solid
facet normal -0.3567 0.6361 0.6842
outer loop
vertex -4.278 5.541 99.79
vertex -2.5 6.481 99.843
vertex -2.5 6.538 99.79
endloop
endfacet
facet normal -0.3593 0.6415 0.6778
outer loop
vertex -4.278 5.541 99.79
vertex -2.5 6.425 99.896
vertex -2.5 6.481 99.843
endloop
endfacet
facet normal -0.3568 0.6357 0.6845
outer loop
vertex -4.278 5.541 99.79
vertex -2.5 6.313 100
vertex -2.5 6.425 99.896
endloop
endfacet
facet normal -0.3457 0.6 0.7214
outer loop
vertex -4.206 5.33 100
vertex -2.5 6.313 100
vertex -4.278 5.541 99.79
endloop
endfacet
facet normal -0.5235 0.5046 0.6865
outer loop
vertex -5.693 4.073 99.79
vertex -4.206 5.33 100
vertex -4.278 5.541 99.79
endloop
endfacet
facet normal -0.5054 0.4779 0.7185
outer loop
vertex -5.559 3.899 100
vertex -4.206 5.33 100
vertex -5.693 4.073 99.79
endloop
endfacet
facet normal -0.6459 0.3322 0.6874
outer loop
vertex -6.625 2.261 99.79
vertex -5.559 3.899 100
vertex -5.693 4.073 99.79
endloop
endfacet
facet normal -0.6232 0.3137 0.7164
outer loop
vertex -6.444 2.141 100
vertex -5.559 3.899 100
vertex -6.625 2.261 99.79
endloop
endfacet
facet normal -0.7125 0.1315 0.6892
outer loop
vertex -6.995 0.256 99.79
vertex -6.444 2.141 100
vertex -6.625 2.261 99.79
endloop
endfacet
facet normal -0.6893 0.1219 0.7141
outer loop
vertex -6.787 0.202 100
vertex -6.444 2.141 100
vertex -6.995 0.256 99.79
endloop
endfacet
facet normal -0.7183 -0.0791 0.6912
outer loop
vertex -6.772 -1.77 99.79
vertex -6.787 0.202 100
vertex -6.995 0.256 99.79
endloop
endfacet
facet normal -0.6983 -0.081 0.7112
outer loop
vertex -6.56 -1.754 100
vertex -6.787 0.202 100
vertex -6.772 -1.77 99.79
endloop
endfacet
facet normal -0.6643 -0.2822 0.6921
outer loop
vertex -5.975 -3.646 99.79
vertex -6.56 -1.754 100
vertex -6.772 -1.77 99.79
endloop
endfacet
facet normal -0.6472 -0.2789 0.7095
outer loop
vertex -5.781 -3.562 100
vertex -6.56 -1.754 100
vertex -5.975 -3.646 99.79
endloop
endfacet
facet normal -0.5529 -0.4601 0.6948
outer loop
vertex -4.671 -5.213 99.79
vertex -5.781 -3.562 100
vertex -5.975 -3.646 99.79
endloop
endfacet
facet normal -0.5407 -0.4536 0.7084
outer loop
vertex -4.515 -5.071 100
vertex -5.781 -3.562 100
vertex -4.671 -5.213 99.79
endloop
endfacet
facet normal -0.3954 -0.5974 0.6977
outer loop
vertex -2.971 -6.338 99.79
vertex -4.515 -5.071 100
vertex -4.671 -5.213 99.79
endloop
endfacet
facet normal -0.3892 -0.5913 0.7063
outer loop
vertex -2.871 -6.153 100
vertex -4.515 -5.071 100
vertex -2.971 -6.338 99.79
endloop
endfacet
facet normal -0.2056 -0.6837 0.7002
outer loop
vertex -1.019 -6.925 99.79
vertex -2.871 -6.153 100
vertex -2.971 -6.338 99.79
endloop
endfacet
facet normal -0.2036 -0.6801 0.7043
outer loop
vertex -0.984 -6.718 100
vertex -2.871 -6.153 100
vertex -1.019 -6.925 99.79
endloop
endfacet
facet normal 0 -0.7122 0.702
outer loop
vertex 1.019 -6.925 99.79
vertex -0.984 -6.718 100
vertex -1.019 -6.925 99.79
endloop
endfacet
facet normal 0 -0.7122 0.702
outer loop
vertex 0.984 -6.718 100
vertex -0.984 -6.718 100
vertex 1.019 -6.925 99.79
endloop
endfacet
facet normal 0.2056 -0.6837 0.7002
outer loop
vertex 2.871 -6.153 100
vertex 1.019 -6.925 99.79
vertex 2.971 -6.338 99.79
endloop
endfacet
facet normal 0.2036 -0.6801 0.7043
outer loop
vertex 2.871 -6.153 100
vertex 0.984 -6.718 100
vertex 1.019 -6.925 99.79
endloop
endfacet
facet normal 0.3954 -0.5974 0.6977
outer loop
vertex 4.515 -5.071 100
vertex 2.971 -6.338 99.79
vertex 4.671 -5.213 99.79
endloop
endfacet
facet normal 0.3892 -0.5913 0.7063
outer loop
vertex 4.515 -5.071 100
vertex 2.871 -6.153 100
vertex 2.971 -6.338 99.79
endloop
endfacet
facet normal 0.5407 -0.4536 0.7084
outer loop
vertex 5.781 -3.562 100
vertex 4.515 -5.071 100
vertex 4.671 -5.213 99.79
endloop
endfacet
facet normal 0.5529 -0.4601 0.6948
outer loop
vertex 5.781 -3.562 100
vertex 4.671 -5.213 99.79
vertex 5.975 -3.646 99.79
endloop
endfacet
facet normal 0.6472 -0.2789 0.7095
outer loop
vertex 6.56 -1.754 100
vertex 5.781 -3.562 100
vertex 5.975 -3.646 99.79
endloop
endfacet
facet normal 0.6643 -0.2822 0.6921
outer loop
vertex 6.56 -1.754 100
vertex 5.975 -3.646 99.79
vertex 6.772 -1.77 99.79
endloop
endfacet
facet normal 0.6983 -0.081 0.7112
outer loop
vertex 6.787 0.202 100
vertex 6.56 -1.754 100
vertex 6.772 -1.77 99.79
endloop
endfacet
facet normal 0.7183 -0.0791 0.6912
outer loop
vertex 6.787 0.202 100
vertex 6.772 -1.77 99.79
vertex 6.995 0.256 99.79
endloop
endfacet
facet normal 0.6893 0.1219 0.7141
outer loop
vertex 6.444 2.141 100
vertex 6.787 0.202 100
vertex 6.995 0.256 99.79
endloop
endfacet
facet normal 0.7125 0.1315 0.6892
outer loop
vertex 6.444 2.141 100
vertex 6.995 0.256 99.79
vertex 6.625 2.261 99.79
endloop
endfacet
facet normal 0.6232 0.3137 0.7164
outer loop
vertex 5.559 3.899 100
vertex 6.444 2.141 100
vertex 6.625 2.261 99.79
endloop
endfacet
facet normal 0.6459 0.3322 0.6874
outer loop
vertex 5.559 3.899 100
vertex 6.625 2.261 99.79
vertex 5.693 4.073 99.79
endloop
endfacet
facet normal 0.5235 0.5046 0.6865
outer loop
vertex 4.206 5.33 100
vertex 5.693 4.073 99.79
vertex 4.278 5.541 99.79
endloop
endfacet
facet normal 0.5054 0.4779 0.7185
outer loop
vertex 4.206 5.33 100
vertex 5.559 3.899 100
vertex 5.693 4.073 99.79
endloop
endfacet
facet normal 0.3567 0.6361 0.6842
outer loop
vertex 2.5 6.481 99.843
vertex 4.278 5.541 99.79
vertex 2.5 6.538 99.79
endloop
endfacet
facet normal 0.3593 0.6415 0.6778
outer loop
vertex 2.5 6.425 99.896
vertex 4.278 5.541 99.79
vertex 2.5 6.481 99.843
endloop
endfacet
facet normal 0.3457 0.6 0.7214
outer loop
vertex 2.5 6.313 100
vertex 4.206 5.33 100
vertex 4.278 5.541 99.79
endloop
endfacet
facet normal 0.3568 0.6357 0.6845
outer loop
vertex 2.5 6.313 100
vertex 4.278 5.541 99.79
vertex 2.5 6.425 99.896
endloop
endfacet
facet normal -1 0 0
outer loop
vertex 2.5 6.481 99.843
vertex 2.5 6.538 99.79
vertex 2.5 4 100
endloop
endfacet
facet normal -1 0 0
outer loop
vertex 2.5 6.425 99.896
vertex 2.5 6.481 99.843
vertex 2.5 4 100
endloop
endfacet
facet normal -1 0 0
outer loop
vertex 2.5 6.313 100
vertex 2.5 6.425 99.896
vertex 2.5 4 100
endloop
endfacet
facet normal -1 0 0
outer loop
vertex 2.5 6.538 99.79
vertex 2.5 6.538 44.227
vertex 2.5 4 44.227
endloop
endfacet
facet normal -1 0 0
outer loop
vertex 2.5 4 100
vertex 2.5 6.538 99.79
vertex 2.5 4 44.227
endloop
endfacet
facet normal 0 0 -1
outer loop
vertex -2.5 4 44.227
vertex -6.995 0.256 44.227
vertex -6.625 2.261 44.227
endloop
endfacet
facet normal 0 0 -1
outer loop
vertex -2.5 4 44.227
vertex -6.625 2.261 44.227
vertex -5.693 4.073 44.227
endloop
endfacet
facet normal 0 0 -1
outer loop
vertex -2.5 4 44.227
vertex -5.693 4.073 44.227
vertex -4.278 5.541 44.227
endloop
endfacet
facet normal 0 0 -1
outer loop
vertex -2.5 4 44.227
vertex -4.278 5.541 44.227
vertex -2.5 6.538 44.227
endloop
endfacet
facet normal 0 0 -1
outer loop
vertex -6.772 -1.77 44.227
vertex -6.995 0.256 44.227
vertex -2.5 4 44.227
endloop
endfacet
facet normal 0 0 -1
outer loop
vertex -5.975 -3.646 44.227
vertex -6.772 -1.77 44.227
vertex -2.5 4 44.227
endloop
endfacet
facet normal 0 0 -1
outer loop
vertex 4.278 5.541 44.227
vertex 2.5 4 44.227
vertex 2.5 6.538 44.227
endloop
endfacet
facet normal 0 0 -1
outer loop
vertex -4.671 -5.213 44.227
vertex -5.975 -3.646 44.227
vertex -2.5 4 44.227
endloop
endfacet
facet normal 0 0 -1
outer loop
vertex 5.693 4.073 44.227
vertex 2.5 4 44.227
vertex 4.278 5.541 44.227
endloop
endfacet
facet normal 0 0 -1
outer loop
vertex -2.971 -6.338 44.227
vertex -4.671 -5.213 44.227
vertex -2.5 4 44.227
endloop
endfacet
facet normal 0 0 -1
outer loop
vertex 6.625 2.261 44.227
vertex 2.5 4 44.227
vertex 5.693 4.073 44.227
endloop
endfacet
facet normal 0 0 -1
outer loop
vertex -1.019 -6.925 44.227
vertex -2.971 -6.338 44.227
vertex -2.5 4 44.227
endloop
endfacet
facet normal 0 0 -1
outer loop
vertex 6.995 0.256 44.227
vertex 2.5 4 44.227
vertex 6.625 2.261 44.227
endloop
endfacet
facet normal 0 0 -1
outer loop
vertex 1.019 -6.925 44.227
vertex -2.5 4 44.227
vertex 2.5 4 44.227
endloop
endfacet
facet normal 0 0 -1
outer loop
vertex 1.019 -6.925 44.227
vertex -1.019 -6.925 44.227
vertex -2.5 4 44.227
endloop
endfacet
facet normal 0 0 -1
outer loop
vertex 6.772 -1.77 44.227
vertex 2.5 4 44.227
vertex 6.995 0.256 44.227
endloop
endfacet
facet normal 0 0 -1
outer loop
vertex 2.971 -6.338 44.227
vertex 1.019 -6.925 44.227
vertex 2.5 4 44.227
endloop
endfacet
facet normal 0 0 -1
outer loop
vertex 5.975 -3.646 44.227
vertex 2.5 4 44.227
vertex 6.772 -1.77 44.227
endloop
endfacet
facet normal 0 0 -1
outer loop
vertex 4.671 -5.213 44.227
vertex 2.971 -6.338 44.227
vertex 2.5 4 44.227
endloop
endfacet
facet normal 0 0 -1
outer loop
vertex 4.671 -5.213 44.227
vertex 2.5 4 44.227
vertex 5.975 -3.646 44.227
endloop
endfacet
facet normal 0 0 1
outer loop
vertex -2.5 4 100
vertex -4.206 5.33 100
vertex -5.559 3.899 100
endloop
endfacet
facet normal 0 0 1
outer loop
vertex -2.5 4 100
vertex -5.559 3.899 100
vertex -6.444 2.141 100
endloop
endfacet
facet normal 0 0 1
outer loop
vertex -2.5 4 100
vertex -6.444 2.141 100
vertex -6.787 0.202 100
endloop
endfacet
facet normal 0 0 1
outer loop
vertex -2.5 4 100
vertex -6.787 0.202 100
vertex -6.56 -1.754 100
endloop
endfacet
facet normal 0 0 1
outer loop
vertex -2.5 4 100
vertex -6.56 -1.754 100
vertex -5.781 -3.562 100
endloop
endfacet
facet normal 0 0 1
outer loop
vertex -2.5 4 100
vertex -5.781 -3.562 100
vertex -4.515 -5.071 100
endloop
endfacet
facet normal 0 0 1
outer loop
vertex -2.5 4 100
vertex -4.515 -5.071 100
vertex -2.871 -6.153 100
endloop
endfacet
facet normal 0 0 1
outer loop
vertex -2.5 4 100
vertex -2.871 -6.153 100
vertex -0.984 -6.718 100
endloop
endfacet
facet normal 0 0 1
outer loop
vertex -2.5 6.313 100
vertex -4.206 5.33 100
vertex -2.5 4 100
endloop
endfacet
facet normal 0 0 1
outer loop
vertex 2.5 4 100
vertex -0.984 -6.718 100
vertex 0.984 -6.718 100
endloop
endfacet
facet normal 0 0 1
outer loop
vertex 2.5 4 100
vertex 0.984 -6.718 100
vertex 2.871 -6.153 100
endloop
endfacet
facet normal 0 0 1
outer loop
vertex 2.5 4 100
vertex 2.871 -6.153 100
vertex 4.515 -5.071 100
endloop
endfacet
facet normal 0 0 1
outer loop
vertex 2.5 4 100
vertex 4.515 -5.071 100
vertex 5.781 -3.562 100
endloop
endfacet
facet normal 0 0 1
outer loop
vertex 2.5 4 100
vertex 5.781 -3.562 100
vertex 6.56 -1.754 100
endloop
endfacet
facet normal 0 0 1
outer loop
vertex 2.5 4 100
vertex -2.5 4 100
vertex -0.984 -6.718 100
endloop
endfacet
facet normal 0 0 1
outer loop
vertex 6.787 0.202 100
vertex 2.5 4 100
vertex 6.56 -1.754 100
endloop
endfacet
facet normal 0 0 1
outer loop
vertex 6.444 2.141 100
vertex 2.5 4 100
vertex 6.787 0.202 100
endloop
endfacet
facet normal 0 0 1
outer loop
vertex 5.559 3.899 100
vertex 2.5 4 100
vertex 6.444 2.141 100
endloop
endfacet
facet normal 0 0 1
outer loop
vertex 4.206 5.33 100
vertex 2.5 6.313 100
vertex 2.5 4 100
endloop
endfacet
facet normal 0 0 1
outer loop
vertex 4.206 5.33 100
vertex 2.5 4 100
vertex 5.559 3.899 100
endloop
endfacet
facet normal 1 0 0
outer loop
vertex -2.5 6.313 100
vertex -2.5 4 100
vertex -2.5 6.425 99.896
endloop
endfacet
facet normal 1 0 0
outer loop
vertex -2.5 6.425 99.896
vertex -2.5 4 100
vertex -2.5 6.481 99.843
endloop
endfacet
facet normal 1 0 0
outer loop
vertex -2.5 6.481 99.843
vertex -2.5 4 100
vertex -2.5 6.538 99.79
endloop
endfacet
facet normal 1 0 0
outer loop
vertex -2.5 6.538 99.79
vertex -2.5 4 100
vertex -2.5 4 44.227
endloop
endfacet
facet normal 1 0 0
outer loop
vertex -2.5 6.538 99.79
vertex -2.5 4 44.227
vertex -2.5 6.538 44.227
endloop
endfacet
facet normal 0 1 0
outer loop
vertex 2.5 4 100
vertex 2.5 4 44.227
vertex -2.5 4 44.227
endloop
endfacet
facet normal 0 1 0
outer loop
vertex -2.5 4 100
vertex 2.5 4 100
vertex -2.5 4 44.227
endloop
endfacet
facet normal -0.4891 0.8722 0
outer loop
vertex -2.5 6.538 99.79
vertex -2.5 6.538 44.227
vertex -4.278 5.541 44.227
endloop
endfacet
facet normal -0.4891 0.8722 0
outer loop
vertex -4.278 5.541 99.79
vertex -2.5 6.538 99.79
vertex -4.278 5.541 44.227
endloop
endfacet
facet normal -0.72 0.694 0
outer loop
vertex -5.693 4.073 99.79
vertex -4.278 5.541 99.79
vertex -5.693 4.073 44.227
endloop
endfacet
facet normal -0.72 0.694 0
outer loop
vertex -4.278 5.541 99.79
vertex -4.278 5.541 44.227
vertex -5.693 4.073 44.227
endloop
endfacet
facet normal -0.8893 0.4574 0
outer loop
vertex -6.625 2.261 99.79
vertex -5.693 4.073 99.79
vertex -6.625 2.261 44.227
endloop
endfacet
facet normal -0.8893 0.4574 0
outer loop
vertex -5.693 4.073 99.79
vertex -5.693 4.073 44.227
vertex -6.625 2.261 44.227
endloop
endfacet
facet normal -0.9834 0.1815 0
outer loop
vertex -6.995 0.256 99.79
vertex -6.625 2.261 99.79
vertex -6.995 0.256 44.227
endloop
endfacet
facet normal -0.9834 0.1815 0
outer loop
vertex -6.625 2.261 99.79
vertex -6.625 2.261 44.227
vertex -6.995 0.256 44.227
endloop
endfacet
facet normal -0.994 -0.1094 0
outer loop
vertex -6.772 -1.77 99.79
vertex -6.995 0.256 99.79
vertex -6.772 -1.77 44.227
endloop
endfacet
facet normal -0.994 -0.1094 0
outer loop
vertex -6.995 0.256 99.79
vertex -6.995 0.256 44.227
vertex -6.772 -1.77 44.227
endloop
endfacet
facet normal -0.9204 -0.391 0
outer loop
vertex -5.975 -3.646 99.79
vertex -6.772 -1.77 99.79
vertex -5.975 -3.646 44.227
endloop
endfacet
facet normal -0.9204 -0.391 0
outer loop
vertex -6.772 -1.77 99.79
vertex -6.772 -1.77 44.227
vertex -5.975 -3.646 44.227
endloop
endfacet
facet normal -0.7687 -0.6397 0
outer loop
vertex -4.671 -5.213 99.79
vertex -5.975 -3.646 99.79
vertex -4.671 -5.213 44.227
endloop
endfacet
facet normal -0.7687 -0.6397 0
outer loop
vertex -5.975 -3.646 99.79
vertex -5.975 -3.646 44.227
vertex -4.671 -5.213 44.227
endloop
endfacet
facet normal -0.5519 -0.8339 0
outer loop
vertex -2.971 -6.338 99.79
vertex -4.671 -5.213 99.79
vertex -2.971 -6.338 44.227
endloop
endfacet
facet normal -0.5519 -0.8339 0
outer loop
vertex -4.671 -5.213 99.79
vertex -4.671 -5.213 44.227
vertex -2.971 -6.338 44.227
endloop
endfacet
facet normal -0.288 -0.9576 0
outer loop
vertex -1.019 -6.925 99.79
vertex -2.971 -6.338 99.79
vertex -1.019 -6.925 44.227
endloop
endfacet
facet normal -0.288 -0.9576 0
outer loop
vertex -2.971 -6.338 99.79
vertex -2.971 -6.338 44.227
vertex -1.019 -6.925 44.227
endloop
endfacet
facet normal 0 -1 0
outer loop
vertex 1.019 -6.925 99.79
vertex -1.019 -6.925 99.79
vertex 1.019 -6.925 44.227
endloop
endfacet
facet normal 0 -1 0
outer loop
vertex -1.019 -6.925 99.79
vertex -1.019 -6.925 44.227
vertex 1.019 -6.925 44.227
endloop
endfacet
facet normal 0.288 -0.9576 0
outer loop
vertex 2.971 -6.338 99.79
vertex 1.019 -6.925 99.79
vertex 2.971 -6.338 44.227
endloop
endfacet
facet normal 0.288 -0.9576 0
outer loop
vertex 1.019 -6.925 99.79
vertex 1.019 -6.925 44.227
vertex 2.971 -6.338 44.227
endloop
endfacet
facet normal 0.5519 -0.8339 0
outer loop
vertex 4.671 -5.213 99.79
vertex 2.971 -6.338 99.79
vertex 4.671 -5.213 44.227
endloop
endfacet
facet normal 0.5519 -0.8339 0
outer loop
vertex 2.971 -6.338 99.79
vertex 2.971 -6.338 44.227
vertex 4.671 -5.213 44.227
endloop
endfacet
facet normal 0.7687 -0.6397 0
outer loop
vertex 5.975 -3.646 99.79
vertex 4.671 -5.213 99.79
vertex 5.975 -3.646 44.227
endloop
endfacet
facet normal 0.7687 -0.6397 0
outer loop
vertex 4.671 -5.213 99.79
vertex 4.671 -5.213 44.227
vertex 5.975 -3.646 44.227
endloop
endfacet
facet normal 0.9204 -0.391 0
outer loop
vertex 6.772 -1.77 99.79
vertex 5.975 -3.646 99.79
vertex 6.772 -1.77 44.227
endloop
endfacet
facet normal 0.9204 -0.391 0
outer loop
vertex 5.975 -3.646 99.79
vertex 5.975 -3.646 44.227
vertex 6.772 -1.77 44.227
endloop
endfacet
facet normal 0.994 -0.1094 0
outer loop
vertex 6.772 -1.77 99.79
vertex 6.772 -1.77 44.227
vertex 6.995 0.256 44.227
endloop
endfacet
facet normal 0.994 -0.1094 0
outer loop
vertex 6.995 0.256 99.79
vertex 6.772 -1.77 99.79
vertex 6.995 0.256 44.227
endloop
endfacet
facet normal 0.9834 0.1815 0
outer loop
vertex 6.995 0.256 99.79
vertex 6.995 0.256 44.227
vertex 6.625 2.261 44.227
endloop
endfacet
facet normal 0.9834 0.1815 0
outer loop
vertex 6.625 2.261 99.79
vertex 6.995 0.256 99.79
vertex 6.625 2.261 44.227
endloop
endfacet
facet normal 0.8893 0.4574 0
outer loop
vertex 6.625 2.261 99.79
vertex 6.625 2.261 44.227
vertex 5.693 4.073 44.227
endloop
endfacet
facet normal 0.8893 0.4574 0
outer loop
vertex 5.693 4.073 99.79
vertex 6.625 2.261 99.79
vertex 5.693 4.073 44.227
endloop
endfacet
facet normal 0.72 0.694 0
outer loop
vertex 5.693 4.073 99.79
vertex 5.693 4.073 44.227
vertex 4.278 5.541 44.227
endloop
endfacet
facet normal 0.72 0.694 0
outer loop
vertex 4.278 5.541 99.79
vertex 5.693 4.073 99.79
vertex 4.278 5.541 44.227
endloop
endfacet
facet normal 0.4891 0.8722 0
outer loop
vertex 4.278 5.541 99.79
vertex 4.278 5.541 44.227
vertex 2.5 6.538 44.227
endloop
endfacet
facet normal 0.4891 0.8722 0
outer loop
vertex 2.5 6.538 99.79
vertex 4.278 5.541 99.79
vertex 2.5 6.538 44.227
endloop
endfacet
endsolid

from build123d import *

# Parameters (mm, degrees)
BOSS_EXTRUDE1_DEPTH      = 100
BOSS_EXTRUDE1_DEPTH_BACK = 100
CHAMFER1_SIZE            = 0.21
CUT_EXTRUDE1_DEPTH       = 101.488805347
CUT_EXTRUDE1_DEPTH_BACK  = 101.488805347
SKETCH4_W                = 104.931235955
SKETCH4_H                = 144.2275


with BuildPart() as part:
    # Sketch3 → Boss-Extrude1 (new, two sides: drawn at the far end of the back side and taken through both)
    with BuildSketch(Plane.XY.offset(-BOSS_EXTRUDE1_DEPTH_BACK)):
        with BuildLine():
            Line((-2.5, 4), (-2.5, 6.538348415))
            ThreePointArc((-2.5, 6.538348415), (0, -7), (2.5, 6.538348415))
            Line((2.5, 6.538348415), (2.5, 4))
            Line((2.5, 4), (-2.5, 4))
        make_face()
    extrude(amount=BOSS_EXTRUDE1_DEPTH + BOSS_EXTRUDE1_DEPTH_BACK)

    # Chamfer1
    chamfer1_edges = [part.edges().sort_by_distance(p)[0] for p in [
        (0, -7, -100),
        (0, -7, 100),
    ]]
    chamfer(chamfer1_edges, length=CHAMFER1_SIZE)

    # Sketch4 → Cut-Extrude1 (cut, two sides: drawn at the far end of the back side and taken through both)
    with BuildSketch(Plane(origin=(0, 0, 0), x_dir=(1, 0, 0), z_dir=(0, 1, 0)).offset(-CUT_EXTRUDE1_DEPTH_BACK)):
        with Locations((22.551011235, 27.88625)):
            Rectangle(SKETCH4_W, SKETCH4_H)
    extrude(amount=CUT_EXTRUDE1_DEPTH + CUT_EXTRUDE1_DEPTH_BACK, mode=Mode.SUBTRACT)


solid = part.part
